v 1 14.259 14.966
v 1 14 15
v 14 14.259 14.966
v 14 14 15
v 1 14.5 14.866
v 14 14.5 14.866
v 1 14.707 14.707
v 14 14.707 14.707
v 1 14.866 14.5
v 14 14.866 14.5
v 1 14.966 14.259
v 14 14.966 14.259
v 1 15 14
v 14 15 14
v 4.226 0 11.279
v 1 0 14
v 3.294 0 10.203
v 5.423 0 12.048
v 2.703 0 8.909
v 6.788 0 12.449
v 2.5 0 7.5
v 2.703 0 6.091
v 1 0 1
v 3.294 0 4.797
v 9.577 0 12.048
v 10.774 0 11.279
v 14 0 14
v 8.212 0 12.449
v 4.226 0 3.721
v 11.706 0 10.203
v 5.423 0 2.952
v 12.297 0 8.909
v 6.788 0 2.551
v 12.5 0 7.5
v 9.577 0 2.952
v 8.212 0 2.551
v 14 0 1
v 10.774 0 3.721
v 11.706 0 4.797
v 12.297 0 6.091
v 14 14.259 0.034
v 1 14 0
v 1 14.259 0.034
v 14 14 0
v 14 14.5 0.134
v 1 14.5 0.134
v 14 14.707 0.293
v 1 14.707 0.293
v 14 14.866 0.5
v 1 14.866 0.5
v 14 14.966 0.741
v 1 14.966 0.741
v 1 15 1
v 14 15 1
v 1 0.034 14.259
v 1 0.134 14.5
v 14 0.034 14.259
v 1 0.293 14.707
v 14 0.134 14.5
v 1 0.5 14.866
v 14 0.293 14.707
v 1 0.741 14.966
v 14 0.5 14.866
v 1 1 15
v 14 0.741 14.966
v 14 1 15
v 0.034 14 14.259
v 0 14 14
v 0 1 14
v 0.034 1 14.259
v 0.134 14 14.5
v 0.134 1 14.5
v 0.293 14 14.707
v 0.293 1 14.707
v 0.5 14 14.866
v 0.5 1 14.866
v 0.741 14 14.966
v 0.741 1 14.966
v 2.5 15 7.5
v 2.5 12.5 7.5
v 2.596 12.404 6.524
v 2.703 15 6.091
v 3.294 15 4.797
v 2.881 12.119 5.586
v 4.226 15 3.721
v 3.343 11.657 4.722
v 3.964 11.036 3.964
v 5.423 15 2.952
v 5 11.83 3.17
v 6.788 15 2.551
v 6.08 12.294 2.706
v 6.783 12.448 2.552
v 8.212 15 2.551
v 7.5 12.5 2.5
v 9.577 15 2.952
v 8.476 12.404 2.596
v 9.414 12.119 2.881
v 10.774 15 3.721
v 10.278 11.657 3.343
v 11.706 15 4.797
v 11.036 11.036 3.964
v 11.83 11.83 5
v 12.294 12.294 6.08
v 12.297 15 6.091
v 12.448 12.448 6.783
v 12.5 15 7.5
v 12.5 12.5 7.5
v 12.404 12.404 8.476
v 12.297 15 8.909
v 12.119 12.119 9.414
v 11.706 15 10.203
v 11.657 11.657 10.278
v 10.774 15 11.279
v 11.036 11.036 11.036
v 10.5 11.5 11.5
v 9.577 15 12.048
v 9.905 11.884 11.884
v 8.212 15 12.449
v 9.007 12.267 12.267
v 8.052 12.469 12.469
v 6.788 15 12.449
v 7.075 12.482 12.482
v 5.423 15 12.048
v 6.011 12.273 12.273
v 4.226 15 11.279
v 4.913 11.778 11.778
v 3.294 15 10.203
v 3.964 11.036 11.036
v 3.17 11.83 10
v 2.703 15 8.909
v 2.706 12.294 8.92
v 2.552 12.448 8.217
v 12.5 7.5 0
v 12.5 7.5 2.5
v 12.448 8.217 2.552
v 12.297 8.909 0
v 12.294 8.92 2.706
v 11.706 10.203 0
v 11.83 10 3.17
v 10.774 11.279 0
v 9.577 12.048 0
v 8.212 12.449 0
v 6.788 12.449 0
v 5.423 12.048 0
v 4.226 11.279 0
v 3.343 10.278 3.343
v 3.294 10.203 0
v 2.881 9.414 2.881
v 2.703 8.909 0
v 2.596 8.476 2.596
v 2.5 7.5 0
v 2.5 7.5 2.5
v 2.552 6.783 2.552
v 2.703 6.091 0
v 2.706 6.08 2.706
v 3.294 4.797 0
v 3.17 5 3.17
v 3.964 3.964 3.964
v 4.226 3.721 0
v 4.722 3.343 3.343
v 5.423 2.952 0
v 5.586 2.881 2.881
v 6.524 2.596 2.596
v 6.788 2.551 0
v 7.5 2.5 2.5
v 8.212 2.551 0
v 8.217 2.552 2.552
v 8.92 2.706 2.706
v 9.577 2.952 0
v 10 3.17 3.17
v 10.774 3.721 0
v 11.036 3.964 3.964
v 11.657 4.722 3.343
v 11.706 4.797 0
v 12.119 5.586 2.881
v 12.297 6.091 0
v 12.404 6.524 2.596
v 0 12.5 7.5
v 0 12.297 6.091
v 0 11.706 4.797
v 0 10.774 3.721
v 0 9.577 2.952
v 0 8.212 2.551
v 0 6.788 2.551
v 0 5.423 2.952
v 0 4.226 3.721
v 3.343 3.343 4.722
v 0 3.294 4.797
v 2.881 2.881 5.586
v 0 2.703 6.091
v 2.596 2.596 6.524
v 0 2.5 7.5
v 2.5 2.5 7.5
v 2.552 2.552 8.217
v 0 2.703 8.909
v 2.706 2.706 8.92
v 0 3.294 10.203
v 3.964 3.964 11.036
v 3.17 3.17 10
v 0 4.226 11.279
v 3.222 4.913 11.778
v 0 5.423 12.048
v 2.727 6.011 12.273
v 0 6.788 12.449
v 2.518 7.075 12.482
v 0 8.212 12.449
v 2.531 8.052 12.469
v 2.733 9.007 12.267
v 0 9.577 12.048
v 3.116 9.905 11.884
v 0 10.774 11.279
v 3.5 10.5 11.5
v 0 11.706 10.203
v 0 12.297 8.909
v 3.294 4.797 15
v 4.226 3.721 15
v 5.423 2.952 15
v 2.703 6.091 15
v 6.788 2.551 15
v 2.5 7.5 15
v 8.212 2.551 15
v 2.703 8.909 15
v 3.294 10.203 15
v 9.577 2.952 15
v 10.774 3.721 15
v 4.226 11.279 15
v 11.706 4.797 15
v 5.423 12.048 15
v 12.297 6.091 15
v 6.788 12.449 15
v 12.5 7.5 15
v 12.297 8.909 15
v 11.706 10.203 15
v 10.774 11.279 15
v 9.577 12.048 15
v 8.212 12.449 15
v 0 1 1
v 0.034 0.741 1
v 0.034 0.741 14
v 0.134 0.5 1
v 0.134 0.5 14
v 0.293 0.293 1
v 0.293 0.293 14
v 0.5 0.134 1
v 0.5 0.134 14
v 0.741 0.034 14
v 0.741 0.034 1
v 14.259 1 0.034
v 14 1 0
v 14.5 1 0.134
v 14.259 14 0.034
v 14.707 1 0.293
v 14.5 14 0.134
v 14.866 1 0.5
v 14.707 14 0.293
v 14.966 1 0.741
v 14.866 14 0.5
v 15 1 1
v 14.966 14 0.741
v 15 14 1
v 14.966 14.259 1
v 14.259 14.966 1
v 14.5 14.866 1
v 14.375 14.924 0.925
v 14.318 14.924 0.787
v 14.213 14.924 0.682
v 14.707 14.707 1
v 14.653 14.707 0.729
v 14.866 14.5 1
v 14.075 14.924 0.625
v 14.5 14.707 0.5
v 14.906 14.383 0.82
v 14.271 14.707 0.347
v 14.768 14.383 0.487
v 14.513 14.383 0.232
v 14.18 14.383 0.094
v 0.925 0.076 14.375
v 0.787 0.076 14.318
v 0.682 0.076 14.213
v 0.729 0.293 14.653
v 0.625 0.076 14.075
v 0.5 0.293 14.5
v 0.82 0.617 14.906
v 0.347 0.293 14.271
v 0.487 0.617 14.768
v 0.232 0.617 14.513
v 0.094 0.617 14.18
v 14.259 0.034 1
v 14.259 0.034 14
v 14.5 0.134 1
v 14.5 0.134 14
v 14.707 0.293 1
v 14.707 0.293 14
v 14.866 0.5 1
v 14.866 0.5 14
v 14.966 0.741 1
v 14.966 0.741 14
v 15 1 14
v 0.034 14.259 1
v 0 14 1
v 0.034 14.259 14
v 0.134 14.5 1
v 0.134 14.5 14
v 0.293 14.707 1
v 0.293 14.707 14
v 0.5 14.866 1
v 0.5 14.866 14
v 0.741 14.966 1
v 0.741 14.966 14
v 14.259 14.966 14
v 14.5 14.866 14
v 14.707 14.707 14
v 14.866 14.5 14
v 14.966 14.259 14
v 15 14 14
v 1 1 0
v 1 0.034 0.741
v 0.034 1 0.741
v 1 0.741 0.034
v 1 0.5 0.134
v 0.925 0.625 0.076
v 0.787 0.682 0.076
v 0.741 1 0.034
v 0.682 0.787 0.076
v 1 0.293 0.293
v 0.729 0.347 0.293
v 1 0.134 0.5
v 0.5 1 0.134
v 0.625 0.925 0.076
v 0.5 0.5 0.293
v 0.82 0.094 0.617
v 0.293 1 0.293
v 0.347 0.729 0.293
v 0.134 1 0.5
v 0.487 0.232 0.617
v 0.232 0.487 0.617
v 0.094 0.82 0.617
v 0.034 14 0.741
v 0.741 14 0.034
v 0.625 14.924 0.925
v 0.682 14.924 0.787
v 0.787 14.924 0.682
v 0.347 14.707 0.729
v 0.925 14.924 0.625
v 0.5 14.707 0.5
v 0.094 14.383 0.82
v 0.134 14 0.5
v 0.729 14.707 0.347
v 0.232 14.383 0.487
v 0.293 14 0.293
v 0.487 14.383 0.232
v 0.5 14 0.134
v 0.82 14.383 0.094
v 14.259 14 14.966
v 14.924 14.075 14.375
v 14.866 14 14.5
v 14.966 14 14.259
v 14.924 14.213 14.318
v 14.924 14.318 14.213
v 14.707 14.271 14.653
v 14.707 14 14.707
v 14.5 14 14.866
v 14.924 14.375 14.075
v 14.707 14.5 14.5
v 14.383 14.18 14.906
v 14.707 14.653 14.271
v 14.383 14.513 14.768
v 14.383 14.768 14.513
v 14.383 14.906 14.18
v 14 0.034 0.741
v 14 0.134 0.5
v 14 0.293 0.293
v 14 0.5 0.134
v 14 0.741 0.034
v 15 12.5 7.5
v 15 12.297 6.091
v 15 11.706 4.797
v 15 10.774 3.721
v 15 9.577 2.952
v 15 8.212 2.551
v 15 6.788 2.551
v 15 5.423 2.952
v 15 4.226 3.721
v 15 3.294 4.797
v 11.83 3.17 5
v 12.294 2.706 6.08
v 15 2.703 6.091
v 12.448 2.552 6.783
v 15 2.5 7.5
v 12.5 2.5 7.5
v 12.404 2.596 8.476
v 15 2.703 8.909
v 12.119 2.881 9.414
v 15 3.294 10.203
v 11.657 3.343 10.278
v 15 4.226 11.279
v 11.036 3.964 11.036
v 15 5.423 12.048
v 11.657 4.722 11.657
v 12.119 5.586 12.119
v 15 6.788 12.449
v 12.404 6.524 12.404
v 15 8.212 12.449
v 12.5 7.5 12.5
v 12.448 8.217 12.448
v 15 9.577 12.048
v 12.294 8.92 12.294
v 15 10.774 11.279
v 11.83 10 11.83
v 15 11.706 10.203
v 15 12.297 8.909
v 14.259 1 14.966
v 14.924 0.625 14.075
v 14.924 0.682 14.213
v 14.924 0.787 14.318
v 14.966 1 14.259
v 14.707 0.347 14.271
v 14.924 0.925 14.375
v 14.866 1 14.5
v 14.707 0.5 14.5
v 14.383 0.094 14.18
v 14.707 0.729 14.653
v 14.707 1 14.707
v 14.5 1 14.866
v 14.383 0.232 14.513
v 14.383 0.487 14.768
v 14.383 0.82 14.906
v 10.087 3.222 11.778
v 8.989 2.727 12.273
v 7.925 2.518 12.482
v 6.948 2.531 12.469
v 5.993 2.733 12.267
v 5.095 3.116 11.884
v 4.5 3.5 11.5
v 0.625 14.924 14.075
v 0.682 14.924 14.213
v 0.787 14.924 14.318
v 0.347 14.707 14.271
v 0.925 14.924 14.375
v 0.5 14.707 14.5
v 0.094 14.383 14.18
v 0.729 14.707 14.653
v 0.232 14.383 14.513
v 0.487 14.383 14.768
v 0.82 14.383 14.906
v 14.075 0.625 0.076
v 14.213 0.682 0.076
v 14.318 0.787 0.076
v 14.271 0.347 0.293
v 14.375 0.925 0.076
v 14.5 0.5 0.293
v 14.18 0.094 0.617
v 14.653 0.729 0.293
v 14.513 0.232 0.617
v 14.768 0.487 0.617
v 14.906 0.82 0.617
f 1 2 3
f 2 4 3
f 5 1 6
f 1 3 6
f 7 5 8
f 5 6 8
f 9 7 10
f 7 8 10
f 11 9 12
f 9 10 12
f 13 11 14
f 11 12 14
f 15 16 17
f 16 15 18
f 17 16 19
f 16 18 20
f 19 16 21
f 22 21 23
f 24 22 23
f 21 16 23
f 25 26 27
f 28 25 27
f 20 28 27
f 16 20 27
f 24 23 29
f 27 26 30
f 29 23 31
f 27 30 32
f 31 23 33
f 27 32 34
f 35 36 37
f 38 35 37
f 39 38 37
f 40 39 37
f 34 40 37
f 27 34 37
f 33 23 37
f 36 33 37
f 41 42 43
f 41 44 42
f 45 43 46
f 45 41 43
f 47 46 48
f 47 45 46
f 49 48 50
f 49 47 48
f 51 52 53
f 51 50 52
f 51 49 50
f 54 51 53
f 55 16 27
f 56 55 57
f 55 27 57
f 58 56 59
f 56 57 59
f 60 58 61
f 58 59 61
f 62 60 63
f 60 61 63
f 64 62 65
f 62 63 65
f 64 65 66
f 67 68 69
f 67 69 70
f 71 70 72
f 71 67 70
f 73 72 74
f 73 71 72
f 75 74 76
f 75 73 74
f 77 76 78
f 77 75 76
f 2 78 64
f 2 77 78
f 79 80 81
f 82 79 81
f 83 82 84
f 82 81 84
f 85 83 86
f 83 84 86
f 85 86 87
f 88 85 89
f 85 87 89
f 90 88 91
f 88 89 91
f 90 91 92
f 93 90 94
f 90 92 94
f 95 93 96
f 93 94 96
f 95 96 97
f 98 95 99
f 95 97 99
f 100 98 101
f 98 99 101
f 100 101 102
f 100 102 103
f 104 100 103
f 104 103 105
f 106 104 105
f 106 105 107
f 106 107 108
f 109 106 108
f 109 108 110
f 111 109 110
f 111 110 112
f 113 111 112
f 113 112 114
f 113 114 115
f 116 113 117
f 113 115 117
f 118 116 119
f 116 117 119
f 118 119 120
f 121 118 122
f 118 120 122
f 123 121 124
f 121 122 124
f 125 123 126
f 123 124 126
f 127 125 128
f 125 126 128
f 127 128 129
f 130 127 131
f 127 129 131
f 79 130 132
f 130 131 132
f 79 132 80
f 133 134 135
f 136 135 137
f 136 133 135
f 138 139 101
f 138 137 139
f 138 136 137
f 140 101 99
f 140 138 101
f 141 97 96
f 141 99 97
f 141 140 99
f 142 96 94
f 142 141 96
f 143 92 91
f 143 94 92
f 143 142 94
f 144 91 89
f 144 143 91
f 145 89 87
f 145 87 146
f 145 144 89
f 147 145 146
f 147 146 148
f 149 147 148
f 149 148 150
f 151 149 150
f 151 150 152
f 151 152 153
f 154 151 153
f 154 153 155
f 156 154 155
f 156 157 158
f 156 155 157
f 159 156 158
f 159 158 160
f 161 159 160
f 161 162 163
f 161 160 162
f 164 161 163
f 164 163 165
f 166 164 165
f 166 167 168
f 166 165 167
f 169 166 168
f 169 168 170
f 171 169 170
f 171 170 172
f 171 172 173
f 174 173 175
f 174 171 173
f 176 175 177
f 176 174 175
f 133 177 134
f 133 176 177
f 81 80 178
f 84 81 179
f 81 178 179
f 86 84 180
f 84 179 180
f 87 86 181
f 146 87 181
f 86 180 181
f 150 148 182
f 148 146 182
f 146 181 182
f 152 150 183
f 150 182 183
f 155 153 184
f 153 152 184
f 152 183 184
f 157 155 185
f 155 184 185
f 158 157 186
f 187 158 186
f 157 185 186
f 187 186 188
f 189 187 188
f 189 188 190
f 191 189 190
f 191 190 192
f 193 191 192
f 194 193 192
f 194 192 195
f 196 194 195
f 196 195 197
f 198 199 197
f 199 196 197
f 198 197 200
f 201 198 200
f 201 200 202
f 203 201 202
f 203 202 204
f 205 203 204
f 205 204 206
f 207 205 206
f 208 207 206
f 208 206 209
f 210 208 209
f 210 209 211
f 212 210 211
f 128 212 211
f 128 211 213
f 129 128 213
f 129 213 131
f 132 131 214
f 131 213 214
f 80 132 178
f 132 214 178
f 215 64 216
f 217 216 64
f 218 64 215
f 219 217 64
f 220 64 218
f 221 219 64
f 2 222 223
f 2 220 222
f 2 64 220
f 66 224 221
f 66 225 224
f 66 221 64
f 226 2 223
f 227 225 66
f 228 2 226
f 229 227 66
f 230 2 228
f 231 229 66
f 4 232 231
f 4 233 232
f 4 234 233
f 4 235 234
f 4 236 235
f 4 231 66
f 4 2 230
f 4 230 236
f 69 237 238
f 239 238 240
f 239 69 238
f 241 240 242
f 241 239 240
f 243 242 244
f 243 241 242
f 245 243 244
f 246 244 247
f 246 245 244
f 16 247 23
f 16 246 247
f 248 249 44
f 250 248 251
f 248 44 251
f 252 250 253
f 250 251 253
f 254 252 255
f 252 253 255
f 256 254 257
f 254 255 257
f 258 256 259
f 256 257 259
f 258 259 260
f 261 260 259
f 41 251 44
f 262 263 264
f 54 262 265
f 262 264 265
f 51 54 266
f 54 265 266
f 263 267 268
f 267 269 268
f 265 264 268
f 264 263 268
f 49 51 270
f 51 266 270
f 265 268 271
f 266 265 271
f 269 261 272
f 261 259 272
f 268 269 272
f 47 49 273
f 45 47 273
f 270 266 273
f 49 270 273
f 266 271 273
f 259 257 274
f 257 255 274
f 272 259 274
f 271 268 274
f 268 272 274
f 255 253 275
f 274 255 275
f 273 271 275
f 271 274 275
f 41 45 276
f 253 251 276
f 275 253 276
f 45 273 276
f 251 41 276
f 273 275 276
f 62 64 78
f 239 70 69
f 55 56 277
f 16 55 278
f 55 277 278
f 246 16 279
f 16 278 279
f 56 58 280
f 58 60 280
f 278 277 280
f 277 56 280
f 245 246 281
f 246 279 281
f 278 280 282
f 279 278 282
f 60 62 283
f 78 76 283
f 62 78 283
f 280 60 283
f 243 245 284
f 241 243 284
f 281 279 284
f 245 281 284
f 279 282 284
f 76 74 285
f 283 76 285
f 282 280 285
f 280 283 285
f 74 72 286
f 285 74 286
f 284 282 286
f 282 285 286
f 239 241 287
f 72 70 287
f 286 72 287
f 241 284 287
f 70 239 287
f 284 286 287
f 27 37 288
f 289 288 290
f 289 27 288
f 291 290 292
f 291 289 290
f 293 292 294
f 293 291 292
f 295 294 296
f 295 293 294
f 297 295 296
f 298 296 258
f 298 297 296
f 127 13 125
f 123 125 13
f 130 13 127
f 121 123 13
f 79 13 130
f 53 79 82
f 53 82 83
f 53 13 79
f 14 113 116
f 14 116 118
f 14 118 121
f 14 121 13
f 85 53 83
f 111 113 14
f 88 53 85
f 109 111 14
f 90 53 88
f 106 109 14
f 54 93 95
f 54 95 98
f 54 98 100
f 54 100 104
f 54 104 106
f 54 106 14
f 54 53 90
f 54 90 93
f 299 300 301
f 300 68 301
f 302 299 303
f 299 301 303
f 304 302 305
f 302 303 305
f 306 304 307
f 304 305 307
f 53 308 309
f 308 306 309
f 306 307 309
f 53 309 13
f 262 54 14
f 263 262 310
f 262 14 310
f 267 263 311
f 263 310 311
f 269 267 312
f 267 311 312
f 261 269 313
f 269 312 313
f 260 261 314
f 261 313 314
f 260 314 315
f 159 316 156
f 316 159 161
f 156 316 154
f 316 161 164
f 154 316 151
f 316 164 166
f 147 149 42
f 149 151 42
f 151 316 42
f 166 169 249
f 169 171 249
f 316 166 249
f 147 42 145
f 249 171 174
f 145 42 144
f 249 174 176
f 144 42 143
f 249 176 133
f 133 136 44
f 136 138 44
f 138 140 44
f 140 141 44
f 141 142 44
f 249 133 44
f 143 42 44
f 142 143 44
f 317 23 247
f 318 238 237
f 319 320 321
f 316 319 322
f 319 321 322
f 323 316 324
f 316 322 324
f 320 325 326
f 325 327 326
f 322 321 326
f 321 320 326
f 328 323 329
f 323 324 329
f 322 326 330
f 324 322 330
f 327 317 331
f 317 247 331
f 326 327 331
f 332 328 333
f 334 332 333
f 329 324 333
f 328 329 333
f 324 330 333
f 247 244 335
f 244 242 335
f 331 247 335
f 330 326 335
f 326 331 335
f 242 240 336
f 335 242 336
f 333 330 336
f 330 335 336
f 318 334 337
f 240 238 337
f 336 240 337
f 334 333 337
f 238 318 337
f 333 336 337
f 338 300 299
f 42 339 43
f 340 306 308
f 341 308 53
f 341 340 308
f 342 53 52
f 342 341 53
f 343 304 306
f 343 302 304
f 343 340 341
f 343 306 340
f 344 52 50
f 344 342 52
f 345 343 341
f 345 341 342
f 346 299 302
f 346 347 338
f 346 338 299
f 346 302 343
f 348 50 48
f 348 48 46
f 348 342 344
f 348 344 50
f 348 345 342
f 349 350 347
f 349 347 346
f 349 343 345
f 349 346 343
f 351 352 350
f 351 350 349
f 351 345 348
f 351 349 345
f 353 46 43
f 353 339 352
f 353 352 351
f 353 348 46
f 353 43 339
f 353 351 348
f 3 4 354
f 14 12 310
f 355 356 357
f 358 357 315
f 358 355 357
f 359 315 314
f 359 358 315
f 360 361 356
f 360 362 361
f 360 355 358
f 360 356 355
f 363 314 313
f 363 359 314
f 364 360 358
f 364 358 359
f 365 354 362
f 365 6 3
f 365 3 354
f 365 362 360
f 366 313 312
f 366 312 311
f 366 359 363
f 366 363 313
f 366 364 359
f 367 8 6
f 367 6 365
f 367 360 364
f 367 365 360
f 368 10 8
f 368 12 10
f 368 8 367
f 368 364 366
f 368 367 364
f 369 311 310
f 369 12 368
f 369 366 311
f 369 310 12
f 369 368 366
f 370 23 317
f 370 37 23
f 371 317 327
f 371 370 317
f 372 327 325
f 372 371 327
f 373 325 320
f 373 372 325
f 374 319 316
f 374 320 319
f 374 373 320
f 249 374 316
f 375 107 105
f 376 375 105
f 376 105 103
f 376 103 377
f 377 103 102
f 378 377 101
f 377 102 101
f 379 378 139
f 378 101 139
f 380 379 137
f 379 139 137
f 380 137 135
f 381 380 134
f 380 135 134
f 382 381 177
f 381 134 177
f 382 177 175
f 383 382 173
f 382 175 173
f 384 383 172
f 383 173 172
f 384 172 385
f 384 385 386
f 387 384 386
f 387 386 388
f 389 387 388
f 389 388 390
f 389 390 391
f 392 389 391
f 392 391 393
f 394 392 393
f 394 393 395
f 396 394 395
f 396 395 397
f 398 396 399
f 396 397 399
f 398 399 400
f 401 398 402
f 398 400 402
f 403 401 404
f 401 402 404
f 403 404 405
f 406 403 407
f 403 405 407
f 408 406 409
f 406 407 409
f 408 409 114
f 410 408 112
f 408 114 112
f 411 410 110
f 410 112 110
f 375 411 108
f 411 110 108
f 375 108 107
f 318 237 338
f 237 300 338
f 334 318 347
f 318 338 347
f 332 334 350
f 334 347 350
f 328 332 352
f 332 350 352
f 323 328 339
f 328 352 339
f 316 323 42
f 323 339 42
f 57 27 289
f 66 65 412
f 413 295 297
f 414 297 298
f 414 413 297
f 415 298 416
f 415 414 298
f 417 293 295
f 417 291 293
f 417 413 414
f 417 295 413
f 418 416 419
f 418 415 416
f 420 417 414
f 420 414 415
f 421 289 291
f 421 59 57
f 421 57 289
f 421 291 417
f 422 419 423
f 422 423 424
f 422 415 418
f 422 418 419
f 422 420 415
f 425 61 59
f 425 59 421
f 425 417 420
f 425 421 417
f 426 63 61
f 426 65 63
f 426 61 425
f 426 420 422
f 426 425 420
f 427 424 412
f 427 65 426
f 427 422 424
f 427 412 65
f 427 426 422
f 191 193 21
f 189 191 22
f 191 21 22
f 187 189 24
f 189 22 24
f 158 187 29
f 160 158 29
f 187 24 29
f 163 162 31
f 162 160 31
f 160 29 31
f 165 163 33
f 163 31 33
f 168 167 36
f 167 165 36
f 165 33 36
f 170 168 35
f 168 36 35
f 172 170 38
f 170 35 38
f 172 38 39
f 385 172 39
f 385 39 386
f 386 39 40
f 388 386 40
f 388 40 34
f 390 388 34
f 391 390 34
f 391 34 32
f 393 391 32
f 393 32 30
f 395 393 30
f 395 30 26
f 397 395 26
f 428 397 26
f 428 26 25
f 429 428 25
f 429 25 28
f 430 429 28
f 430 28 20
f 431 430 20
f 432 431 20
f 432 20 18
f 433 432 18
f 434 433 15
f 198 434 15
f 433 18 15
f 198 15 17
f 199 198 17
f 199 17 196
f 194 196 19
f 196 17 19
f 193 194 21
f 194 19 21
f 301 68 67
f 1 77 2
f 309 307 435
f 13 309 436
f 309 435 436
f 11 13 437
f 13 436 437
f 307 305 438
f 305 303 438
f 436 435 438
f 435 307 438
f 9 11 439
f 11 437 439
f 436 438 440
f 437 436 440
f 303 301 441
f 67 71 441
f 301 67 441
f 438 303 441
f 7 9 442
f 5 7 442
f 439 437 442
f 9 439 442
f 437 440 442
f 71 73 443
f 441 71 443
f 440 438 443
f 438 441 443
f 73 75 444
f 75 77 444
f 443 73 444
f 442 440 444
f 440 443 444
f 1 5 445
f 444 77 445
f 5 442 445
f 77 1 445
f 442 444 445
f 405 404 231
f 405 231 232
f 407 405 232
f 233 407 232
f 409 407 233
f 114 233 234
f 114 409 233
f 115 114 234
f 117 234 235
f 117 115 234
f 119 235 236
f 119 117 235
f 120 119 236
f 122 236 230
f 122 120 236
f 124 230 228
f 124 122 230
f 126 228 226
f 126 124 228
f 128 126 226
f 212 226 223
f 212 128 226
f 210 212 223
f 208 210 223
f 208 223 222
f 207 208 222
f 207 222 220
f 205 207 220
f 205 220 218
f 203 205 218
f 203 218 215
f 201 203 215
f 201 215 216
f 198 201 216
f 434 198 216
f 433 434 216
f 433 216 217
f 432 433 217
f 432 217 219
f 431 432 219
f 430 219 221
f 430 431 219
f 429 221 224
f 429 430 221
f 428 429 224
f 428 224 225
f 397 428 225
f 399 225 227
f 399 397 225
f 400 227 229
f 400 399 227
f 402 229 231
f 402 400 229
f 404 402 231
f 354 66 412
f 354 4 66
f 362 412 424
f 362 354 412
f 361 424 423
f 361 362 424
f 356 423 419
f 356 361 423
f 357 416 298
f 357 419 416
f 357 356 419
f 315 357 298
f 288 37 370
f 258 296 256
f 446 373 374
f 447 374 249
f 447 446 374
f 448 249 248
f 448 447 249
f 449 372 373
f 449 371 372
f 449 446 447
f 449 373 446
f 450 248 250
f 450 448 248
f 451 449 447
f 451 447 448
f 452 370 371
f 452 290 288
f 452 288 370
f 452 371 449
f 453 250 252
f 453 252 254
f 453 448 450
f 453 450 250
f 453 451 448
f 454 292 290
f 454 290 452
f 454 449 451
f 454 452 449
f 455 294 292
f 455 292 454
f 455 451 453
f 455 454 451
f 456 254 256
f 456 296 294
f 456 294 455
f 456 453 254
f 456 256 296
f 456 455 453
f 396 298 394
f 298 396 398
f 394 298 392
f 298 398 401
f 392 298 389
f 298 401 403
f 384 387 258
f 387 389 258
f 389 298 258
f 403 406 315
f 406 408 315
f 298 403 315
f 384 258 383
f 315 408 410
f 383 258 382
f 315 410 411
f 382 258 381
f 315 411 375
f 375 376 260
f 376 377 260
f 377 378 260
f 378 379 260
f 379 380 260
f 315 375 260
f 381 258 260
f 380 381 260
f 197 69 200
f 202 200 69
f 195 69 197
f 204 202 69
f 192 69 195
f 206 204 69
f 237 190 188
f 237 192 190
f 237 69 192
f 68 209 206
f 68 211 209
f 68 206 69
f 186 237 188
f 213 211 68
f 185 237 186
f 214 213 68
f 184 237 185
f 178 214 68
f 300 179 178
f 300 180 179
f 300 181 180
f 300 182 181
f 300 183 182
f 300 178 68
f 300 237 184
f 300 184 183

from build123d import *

# Parameters (mm, degrees)
F0_W     = 15
F0_H     = 15
F0_R     = 5
F1_DEPTH = 15
F3_DEPTH = 15.001
F5_DEPTH = 15.001
F6_R     = 1


with BuildPart() as f1:
    # F0 (on Top) → F1 (new body)
    with BuildSketch(Plane.XY):
        with Locations((7.5, 7.5)):
            Rectangle(F0_W, F0_H)
        with Locations((7.5, 7.5)):
            Circle(F0_R, mode=Mode.SUBTRACT)
    extrude(amount=F1_DEPTH)

    # F2 (on face) → F3 (cut, through all)
    with BuildSketch(Plane.XZ):
        with BuildLine():
            Line((2.5, 7.5), (12.5, 7.5))
            ThreePointArc((12.5, 7.5), (7.5, 12.5), (2.5, 7.5))
        make_face()
        with BuildLine():
            ThreePointArc((2.5, 7.5), (7.5, 2.5), (12.5, 7.5))
            Line((12.5, 7.5), (2.5, 7.5))
        make_face()
    extrude(amount=-F3_DEPTH, mode=Mode.SUBTRACT)

    # F4 (on face) → F5 (cut, through all)
    with BuildSketch(Plane(origin=(0, 0, 0), x_dir=(0, -1, 0), z_dir=(-1, 0, 0))):
        with BuildLine():
            Line((-12.5, 7.5), (-2.5, 7.5))
            ThreePointArc((-2.5, 7.5), (-7.5, 12.5), (-12.5, 7.5))
        make_face()
        with BuildLine():
            ThreePointArc((-12.5, 7.5), (-7.5, 2.5), (-2.5, 7.5))
            Line((-2.5, 7.5), (-12.5, 7.5))
        make_face()
    extrude(amount=-F5_DEPTH, mode=Mode.SUBTRACT)

    # F6
    f6_edges = [f1.edges().sort_by_distance(p)[0] for p in [
        (0, 7.5, 15),
        (7.5, 0, 15),
        (0, 0, 7.5),
        (15, 0, 7.5),
        (7.5, 0, 0),
        (0, 7.5, 0),
        (0, 15, 7.5),
        (7.5, 15, 15),
        (15, 7.5, 15),
        (15, 7.5, 0),
        (15, 15, 7.5),
        (7.5, 15, 0),
    ]]
    fillet(f6_edges, radius=F6_R)


solid = f1.part
